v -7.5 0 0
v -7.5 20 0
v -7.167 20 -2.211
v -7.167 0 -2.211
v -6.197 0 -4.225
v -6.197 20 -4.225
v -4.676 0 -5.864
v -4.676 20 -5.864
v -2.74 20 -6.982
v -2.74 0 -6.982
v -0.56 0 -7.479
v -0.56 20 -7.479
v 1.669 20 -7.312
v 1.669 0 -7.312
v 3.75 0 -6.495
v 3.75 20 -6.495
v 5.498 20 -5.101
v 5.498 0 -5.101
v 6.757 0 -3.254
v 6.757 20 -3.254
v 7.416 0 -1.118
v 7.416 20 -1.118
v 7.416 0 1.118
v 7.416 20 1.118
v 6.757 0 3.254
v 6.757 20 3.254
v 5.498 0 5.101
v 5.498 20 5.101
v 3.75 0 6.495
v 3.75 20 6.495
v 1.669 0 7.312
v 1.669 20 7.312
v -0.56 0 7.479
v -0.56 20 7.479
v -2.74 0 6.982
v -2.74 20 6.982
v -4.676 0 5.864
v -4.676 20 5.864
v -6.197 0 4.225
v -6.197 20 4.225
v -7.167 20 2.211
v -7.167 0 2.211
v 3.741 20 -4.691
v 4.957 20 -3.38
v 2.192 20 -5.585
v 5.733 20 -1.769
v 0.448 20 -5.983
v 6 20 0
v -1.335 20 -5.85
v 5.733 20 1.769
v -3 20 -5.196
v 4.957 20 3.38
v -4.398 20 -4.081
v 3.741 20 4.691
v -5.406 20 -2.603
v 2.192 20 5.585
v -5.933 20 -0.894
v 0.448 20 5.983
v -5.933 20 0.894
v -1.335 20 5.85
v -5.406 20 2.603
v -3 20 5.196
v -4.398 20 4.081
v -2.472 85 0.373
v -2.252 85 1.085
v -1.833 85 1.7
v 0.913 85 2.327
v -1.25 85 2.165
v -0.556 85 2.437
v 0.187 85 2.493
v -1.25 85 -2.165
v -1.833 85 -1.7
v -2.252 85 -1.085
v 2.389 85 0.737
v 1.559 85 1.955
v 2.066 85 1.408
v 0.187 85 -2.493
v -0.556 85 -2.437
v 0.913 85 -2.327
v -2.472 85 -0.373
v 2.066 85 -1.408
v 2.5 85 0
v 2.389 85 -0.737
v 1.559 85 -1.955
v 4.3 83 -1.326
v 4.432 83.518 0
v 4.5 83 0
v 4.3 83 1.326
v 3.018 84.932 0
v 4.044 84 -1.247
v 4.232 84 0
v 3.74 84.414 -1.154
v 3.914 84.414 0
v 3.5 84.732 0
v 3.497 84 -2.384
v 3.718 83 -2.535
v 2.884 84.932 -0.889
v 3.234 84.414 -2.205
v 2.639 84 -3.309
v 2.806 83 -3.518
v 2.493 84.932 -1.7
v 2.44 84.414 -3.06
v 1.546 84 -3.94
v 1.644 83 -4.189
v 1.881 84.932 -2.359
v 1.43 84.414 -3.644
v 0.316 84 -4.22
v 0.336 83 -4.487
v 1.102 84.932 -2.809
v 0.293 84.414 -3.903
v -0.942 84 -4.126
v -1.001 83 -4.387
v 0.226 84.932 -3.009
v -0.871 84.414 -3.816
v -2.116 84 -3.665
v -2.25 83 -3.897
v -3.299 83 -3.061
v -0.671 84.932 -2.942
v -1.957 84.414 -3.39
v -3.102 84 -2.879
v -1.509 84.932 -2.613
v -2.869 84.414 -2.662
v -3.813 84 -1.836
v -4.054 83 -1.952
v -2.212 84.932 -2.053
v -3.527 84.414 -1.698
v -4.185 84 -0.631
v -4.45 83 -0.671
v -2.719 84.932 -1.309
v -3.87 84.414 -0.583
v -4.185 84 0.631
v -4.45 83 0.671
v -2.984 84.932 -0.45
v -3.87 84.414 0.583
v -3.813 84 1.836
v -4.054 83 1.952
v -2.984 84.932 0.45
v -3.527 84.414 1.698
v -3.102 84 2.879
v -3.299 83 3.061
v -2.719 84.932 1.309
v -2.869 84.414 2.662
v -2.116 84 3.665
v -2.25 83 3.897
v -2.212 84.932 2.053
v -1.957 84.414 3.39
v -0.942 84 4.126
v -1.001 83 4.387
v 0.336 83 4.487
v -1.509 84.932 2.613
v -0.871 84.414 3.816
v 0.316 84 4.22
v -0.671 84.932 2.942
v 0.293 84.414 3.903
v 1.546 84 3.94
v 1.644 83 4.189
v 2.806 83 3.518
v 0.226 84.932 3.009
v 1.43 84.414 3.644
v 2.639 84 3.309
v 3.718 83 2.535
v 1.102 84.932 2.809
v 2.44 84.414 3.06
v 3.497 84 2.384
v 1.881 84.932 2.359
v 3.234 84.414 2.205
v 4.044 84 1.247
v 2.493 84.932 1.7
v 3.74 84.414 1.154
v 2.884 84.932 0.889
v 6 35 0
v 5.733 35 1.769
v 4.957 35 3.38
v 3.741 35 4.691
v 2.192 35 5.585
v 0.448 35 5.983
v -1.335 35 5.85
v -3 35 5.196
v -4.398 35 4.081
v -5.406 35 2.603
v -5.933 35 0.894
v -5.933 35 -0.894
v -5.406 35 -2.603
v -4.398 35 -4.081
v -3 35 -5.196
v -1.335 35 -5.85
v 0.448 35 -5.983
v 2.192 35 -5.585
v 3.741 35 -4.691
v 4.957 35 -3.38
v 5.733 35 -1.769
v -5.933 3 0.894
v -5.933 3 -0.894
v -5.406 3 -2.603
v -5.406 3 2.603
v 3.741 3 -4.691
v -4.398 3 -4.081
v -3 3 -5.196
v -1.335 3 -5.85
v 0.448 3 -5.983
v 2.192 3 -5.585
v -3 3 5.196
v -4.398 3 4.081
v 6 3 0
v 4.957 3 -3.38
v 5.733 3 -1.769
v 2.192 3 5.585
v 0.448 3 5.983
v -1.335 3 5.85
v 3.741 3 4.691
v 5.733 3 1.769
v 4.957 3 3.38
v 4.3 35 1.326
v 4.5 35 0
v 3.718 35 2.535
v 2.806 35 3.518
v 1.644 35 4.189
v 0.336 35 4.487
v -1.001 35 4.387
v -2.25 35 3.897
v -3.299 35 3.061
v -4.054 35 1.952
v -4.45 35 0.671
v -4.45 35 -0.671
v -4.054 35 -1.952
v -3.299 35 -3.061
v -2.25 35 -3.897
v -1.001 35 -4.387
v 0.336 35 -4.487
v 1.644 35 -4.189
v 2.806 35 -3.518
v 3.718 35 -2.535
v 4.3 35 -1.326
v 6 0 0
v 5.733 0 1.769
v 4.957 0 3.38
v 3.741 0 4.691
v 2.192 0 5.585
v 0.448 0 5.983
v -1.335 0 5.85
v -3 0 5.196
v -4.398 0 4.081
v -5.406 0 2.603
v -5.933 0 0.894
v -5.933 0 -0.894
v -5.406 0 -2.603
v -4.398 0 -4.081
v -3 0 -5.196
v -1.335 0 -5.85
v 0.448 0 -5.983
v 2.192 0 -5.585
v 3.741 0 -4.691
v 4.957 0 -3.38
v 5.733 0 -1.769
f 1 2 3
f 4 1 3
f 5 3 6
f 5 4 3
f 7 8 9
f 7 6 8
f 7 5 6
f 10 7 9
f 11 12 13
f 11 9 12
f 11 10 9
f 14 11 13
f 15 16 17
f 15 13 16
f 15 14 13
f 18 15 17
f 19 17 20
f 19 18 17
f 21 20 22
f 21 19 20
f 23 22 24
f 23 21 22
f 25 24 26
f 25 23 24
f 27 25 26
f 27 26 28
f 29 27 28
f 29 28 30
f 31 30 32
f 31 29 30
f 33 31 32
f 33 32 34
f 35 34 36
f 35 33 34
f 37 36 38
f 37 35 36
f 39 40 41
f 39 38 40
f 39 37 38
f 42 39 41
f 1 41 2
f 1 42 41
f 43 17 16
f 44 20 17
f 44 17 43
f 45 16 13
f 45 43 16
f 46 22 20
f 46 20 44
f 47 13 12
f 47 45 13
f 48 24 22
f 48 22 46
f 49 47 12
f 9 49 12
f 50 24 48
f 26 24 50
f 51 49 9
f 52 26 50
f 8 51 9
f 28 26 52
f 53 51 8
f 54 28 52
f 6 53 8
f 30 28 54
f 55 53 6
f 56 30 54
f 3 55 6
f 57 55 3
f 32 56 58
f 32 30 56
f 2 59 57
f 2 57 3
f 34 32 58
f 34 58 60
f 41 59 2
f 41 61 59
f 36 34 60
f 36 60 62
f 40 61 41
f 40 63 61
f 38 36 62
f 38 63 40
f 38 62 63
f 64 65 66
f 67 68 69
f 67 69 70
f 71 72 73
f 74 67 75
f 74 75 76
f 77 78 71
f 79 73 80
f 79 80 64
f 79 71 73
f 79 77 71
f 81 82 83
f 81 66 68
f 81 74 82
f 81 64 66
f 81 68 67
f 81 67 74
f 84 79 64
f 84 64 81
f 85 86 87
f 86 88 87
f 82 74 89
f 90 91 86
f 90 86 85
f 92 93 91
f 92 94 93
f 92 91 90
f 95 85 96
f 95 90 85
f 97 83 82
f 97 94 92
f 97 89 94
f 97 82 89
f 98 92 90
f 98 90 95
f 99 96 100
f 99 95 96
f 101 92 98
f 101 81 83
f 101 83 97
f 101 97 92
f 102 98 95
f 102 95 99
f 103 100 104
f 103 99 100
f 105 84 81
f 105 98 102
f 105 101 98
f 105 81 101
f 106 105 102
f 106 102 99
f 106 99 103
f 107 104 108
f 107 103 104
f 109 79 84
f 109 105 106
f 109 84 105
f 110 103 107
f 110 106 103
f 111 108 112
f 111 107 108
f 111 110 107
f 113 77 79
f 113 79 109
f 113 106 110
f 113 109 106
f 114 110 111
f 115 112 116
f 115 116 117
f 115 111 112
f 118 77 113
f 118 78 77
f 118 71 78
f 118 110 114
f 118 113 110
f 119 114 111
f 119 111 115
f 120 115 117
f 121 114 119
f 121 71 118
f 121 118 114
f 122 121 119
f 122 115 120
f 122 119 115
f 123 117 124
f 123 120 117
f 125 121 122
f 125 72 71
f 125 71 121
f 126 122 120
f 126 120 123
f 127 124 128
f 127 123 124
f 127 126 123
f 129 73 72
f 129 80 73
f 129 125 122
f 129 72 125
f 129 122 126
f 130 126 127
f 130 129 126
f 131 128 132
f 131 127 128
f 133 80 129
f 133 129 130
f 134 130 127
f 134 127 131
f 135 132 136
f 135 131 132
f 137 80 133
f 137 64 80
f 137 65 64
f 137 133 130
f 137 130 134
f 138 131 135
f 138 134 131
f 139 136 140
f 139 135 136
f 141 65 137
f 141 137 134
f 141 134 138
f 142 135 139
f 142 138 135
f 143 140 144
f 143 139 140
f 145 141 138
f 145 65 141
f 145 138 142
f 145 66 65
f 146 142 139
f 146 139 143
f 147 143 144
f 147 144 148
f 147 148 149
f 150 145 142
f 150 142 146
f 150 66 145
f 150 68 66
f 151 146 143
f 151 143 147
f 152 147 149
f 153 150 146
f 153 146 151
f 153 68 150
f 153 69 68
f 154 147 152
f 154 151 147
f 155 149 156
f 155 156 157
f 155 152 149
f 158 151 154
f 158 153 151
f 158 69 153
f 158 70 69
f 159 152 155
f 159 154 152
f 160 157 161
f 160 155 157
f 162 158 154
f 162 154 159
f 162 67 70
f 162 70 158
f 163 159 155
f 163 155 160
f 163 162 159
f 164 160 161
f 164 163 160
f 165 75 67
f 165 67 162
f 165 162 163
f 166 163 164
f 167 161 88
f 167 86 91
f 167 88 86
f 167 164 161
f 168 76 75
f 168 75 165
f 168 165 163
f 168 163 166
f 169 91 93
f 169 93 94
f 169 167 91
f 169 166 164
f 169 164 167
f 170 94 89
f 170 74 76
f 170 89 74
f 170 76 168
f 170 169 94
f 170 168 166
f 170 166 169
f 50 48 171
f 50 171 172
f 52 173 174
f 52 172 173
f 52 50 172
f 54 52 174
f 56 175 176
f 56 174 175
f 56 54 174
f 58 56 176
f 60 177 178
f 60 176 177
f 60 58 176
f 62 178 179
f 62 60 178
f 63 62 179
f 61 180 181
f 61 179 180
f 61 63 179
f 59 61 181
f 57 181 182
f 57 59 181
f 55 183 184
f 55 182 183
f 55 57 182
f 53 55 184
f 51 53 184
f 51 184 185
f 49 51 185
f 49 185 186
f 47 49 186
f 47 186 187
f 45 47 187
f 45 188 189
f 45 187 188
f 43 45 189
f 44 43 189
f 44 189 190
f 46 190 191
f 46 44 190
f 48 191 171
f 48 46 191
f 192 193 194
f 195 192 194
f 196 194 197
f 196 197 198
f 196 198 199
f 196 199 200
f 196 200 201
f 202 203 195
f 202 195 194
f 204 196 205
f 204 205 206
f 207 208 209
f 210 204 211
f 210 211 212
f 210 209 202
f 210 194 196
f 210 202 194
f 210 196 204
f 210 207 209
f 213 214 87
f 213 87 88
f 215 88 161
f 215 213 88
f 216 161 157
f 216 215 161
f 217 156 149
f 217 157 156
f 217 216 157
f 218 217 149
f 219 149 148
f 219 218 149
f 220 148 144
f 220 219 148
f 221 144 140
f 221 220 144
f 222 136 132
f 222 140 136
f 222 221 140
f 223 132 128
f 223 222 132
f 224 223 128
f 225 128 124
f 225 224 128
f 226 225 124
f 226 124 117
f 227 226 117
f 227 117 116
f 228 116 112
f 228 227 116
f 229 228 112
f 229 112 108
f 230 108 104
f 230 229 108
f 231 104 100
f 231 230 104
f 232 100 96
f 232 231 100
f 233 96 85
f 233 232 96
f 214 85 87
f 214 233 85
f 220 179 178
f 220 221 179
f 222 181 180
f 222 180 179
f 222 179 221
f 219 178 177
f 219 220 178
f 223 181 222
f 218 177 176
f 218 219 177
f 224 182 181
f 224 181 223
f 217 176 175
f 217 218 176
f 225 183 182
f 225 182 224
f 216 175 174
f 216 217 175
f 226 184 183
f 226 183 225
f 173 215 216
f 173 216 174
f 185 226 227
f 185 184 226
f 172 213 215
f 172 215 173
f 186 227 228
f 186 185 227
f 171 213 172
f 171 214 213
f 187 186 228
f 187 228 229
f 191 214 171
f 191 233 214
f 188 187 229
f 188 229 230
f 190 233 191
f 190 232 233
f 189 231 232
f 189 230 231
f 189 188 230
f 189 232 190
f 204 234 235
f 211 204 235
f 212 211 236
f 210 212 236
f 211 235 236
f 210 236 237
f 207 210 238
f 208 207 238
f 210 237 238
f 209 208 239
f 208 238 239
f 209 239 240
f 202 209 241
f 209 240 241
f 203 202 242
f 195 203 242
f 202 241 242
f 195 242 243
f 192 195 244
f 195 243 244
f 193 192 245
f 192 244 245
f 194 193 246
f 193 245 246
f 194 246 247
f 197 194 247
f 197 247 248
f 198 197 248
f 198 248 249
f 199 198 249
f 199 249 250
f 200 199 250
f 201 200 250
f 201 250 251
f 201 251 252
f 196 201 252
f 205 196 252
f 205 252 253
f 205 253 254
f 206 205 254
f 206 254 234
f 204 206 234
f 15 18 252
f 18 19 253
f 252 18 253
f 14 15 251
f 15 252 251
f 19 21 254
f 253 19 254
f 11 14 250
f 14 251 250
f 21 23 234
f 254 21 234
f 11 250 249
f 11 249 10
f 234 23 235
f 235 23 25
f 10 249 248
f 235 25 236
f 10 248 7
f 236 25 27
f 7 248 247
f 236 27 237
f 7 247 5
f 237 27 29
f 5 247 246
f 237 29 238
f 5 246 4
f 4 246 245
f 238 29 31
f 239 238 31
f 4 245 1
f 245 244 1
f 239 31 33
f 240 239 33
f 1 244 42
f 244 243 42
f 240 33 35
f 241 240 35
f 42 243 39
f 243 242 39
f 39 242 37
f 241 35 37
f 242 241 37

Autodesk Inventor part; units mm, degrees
ref_plane "YZ Plane" through (0, 0, 0) normal (1, 0, 0) x (0, 1, 0)
ref_plane "XZ Plane" through (0, 0, 0) normal (0, 1, 0) x (-1, 0, 0)
ref_plane "XY Plane" through (0, 0, 0) normal (0, 0, 1) x (1, 0, 0)
sketch "Sketch1" plane through (0, 0, 0) normal (0, 1, 0) x (-1, 0, 0)
  circle A0 centre (0, 0) radius 7.5
  dimension "d0" = 15
extrude "Extrusion1" add sketch "Sketch1" along normal blind 20
sketch "Sketch2" plane through (0, 20, 0) normal (0, 1, 0) x (1, 0, 0)
  circle A0 centre (0, 0) radius 6
  dimension "d3" = 12
extrude "Extrusion2" add sketch "Sketch2" along normal blind 15
sketch "Sketch3" plane through (0, 35, 0) normal (0, 1, 0) x (1, 0, 0)
  circle A0 centre (0, 0) radius 4.5
  dimension "d6" = 9
extrude "Extrusion3" add sketch "Sketch3" along normal blind 50
sketch "Sketch4" plane through (0, 85, 0) normal (0, 1, 0) x (1, 0, 0)
  point P0 (0, 0)
fillet "Fillet1" radius 2 1 edges at (-4.5, 85, 0)
sketch "Sketch5" plane through (0, 0, 0) normal (0, -1, 0) x (1, 0, 0)
  point P0 (0, 0)
sketch "Sketch6" plane through (0, 0, 0) normal (0, -1, 0) x (1, 0, 0)
  circle A0 centre (0, 0) radius 6
  dimension "d10" = 12
extrude "Extrusion4" cut sketch "Sketch6" against normal blind 3
properties part number "Antenna that serves no purpose other than to look cool"
